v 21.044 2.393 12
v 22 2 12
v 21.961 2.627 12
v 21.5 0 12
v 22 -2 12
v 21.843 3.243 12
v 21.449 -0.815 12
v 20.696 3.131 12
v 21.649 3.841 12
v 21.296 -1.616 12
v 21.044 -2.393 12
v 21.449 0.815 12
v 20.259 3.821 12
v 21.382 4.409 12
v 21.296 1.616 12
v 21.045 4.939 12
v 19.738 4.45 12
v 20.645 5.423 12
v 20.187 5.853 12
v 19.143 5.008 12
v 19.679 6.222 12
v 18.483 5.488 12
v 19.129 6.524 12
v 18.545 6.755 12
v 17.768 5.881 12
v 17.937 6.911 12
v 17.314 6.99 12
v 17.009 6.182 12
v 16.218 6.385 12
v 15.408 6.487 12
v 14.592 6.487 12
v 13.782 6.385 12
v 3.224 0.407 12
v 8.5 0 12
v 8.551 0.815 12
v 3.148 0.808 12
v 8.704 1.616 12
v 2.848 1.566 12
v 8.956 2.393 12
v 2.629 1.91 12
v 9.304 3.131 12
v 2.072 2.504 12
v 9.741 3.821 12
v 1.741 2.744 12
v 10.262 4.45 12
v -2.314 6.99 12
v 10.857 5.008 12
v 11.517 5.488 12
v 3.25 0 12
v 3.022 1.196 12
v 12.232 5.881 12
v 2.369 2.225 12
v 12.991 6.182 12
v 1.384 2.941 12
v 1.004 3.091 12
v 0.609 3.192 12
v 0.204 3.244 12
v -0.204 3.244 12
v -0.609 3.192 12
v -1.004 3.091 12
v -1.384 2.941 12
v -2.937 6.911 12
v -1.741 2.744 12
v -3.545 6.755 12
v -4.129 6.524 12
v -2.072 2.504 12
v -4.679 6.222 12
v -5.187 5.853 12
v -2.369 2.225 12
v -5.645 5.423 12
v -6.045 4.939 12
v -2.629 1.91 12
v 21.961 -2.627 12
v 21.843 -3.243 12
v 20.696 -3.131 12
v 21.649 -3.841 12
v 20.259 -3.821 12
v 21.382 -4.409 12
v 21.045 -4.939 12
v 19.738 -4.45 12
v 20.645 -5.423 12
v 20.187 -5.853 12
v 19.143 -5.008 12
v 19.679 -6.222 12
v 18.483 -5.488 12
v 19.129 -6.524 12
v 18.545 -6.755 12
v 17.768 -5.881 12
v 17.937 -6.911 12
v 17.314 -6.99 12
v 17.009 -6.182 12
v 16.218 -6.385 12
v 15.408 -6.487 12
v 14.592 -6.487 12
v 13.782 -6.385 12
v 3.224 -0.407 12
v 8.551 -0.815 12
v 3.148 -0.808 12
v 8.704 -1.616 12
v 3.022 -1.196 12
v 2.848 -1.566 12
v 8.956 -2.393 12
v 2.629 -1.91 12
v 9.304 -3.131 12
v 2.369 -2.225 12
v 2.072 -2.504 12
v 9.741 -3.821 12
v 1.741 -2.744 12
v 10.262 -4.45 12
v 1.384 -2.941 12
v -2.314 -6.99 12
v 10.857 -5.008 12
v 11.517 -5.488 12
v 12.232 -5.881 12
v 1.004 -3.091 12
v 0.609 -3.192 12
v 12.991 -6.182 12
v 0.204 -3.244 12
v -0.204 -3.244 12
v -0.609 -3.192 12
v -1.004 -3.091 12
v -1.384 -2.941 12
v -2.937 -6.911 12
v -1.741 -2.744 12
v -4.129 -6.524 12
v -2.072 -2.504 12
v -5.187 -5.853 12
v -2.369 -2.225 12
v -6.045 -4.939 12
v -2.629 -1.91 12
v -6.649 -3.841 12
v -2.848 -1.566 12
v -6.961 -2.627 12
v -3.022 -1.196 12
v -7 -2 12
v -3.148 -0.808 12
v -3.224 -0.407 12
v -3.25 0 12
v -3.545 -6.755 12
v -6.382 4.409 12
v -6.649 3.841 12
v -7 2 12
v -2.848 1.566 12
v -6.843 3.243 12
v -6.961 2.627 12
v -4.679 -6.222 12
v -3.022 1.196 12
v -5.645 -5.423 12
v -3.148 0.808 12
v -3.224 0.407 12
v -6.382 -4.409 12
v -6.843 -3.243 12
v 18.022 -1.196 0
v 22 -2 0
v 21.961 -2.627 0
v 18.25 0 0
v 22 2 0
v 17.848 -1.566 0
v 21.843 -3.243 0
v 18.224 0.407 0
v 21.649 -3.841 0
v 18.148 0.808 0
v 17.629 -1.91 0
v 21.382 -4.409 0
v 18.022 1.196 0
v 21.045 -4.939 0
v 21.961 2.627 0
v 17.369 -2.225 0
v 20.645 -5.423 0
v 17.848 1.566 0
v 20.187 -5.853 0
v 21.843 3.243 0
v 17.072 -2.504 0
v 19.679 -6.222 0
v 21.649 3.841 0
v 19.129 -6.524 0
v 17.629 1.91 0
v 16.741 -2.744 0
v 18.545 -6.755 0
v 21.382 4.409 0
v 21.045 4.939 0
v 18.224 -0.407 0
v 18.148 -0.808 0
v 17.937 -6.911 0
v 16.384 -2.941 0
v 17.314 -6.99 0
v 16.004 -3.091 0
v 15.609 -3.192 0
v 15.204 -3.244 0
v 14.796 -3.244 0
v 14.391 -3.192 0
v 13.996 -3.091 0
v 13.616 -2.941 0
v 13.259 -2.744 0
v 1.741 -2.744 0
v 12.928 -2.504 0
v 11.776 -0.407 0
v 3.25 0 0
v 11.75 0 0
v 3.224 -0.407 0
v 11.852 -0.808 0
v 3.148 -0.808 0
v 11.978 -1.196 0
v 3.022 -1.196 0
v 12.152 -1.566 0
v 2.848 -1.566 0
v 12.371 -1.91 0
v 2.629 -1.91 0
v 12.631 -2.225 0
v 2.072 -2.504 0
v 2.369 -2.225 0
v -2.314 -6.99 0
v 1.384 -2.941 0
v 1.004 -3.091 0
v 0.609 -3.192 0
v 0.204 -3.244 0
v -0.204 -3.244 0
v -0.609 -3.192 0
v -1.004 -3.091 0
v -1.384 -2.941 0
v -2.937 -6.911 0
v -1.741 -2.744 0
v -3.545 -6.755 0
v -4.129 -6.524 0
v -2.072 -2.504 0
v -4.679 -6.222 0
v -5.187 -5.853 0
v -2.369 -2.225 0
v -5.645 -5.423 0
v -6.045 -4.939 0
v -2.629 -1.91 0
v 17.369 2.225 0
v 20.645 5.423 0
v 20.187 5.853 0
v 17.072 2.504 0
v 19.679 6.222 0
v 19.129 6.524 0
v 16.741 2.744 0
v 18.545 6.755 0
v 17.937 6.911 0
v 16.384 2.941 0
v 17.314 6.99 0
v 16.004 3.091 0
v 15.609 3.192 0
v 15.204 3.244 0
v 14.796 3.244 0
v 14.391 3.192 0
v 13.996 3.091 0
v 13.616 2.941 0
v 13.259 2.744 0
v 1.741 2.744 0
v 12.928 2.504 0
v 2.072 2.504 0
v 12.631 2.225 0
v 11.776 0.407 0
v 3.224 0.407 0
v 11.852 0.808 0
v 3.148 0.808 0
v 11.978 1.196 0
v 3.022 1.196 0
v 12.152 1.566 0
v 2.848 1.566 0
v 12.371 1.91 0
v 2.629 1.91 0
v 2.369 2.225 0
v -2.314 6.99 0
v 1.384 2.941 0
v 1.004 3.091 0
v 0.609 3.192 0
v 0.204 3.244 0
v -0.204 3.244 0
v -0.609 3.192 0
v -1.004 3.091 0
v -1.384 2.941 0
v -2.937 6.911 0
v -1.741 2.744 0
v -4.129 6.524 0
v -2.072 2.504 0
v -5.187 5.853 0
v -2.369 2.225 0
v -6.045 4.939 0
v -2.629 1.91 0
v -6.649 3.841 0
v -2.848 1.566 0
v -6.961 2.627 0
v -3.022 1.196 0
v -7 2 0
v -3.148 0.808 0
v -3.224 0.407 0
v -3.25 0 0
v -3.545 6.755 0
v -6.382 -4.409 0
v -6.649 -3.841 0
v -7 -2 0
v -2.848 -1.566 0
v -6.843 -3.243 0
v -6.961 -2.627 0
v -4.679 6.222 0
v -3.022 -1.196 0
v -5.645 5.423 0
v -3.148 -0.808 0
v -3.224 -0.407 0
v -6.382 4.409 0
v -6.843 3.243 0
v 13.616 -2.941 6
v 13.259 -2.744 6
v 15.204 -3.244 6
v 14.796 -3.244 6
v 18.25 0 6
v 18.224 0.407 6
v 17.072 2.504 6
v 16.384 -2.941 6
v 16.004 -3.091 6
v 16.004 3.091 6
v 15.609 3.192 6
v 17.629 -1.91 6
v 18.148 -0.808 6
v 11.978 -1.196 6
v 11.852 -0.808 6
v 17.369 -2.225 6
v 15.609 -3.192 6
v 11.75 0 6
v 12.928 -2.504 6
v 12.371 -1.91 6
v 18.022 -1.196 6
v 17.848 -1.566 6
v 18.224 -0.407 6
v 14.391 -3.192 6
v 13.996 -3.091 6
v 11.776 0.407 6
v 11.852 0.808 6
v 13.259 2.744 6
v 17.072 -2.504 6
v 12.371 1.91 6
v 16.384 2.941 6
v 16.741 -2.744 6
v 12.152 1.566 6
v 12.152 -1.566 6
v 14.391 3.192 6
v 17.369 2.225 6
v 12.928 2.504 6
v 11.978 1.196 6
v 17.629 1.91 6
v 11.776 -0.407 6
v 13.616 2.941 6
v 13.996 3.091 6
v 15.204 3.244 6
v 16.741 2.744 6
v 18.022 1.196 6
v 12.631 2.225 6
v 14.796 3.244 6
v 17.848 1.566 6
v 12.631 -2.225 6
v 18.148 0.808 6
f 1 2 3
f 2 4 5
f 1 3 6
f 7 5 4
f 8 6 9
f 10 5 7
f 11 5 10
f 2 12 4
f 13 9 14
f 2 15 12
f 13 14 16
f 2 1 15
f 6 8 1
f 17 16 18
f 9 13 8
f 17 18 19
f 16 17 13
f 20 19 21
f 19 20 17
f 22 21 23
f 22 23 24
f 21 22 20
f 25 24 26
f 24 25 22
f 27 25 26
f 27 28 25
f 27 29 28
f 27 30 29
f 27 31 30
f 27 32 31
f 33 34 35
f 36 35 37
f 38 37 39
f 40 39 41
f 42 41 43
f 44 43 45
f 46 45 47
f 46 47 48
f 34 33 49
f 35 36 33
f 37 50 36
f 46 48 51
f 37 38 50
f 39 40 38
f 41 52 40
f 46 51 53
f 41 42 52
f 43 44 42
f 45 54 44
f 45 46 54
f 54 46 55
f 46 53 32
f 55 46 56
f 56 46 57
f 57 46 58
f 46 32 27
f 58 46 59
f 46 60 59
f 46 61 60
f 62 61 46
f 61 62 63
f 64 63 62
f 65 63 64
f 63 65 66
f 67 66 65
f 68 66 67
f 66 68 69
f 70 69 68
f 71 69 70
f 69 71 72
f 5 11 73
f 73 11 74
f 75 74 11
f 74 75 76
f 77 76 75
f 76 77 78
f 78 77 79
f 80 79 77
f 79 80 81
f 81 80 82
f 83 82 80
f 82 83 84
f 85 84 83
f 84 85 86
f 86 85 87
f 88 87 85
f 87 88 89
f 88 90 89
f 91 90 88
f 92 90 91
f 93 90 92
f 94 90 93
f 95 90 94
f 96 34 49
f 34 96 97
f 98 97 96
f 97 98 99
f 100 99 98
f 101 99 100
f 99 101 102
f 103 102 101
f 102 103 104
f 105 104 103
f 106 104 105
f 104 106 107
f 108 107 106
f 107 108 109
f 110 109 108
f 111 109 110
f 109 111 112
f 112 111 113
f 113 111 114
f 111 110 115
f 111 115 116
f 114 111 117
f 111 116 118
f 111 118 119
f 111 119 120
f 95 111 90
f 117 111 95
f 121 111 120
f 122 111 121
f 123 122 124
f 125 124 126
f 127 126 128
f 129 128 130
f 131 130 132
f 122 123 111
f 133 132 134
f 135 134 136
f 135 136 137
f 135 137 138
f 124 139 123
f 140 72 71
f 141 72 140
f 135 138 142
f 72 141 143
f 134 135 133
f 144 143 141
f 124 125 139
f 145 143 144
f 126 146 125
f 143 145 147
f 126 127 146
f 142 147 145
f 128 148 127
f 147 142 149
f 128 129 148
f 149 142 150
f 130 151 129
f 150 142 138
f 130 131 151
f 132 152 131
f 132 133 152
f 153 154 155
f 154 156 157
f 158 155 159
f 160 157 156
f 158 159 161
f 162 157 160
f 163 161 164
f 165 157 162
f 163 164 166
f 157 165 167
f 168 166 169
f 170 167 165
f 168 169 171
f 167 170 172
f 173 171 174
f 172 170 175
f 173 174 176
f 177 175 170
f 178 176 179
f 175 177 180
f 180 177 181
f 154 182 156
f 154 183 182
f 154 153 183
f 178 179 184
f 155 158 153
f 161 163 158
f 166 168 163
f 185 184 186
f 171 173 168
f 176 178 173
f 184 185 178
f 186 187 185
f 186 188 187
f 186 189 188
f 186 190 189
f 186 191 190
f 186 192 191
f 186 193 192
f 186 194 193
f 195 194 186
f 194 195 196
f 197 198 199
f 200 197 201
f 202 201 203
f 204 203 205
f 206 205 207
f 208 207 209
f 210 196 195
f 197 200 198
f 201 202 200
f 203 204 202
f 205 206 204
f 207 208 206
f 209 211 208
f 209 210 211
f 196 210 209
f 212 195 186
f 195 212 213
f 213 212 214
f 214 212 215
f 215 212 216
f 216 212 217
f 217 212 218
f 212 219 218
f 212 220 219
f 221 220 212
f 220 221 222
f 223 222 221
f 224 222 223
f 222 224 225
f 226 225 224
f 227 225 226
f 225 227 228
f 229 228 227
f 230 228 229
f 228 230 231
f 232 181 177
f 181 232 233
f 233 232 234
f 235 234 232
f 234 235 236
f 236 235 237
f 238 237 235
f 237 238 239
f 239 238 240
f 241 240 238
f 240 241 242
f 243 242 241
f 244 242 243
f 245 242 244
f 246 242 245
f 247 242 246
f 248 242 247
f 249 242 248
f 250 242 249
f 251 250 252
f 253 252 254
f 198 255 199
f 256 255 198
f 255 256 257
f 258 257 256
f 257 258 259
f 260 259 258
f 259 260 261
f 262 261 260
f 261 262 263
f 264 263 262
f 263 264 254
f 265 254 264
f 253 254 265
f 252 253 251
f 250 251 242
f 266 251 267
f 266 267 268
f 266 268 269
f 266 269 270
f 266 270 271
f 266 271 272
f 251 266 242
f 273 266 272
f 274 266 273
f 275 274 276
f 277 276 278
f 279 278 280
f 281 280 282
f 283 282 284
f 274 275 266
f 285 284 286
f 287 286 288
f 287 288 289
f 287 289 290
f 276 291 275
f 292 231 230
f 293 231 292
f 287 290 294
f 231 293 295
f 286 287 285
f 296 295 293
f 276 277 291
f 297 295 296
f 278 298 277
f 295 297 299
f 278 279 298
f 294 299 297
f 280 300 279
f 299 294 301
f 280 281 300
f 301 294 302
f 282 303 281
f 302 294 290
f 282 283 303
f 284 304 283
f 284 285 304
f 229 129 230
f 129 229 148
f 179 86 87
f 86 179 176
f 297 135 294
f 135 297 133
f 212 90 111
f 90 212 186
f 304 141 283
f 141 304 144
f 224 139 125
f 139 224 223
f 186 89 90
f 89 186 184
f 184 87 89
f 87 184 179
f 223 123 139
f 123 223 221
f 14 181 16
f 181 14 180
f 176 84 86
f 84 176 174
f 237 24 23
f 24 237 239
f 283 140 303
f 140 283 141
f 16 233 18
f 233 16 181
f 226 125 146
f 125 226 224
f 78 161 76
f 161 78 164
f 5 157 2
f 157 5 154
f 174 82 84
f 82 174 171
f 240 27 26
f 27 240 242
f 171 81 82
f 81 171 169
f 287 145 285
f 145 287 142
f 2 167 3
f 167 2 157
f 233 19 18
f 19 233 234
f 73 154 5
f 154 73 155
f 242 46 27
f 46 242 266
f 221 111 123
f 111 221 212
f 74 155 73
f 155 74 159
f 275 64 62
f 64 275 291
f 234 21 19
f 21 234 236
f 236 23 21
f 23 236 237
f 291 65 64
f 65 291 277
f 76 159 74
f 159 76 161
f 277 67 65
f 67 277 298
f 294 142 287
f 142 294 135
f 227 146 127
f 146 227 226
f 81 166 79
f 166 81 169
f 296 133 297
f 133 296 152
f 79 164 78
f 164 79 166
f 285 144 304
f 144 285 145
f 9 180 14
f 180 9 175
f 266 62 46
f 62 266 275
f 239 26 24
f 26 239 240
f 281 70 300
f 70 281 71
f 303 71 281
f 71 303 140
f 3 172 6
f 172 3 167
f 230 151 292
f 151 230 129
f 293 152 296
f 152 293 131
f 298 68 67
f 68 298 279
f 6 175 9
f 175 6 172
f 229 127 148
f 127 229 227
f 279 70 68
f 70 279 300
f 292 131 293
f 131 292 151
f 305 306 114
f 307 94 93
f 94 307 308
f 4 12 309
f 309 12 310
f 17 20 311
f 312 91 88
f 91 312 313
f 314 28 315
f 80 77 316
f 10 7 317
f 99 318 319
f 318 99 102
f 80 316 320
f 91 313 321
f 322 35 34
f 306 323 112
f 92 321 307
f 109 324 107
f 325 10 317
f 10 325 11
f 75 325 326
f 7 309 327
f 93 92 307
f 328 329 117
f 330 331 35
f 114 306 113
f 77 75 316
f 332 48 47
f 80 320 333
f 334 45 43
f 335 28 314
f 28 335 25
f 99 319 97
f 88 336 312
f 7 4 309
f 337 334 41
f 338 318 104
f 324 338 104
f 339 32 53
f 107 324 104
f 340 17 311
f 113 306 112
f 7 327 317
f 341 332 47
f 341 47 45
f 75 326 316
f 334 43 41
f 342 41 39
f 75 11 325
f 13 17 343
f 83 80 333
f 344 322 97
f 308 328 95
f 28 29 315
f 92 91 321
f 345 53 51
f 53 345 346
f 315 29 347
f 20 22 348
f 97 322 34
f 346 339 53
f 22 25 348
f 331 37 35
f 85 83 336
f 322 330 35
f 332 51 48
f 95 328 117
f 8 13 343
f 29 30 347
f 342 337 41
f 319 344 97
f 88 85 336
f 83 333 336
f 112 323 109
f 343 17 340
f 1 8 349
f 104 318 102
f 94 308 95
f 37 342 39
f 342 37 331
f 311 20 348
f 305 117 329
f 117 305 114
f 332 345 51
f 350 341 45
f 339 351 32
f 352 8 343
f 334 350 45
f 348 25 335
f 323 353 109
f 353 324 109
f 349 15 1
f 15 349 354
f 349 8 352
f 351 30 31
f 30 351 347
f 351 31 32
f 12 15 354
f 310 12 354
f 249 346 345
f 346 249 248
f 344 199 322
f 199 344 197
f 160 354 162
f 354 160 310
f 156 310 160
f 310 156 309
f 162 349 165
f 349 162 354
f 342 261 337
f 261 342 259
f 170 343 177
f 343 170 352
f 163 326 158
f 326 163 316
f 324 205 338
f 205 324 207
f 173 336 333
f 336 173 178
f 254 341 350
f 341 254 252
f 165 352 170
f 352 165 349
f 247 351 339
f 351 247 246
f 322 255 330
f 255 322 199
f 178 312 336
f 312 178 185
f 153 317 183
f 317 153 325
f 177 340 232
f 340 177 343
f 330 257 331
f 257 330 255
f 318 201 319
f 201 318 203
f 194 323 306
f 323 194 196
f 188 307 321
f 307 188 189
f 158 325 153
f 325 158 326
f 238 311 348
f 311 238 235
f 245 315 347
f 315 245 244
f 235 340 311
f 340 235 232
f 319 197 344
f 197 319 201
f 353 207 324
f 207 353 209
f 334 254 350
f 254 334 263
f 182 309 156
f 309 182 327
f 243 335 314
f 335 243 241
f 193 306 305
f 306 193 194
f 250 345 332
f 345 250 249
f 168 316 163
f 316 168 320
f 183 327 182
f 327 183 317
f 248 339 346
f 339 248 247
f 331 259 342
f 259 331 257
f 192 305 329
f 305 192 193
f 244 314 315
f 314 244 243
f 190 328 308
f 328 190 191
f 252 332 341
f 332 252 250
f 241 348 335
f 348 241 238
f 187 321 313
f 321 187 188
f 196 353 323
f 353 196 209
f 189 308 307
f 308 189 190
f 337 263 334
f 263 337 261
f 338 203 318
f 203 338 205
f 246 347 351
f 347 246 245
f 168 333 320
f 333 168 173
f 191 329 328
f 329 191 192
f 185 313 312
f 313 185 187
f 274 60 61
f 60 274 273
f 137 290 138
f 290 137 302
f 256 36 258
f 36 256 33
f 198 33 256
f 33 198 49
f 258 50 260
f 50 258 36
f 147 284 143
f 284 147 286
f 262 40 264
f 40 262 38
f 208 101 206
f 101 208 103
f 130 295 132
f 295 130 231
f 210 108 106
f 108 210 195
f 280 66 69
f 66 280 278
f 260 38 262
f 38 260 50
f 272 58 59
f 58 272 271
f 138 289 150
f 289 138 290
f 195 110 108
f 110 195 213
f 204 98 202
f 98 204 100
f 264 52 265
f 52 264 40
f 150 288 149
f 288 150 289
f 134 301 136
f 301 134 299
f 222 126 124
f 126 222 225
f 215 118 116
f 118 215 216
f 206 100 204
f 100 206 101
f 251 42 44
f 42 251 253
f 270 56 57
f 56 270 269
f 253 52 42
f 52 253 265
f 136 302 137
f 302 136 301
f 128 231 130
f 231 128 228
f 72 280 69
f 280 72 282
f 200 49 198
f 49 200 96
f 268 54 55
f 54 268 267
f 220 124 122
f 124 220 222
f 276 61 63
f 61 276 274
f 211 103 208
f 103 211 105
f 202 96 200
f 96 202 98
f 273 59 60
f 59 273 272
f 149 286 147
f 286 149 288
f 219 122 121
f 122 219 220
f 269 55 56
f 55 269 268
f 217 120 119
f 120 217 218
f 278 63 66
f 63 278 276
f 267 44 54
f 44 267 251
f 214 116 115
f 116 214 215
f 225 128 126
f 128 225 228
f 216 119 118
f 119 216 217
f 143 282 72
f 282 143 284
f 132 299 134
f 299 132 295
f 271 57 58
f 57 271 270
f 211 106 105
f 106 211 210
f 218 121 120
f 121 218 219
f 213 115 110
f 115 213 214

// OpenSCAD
$fn = 50;


difference() {
	union() {
		cylinder(h = 12, r = 7.0000000000);
		translate(v = [7.5000000000, 0.0000000000, 0]) {
			hull() {
				translate(v = [-9.5000000000, 2.0000000000, 0]) {
					cylinder(h = 12, r = 5);
				}
				translate(v = [9.5000000000, 2.0000000000, 0]) {
					cylinder(h = 12, r = 5);
				}
				translate(v = [-9.5000000000, -2.0000000000, 0]) {
					cylinder(h = 12, r = 5);
				}
				translate(v = [9.5000000000, -2.0000000000, 0]) {
					cylinder(h = 12, r = 5);
				}
			}
		}
		translate(v = [7.5000000000, 0.0000000000, 0]) {
			hull() {
				translate(v = [-9.5000000000, 2.0000000000, 0]) {
					cylinder(h = 12, r = 5);
				}
				translate(v = [9.5000000000, 2.0000000000, 0]) {
					cylinder(h = 12, r = 5);
				}
				translate(v = [-9.5000000000, -2.0000000000, 0]) {
					cylinder(h = 12, r = 5);
				}
				translate(v = [9.5000000000, -2.0000000000, 0]) {
					cylinder(h = 12, r = 5);
				}
			}
		}
	}
	union() {
		translate(v = [15.0000000000, 0.0000000000, 12]) {
			rotate(a = [0, 0, 0]) {
				difference() {
					union() {
						#translate(v = [0, 0, -12.0000000000]) {
							cylinder(h = 12, r = 2.2500000000);
						}
						#translate(v = [0, 0, -6]) {
							cylinder(h = 6, r1 = 3.2500000000, r2 = 6.5000000000);
						}
						#translate(v = [0, 0, -12.0000000000]) {
							cylinder(h = 12, r = 3.2500000000);
						}
						#translate(v = [0, 0, -12.0000000000]) {
							cylinder(h = 12, r = 2.2500000000);
						}
					}
					union();
				}
			}
		}
		translate(v = [15.0000000000, 0.0000000000, 12]) {
			rotate(a = [0, 0, 0]) {
				difference() {
					union() {
						#translate(v = [0, 0, -12.0000000000]) {
							cylinder(h = 12, r = 2.2500000000);
						}
						#translate(v = [0, 0, -6]) {
							cylinder(h = 6, r1 = 3.2500000000, r2 = 6.5000000000);
						}
						#translate(v = [0, 0, -12.0000000000]) {
							cylinder(h = 12, r = 3.2500000000);
						}
						#translate(v = [0, 0, -12.0000000000]) {
							cylinder(h = 12, r = 2.2500000000);
						}
					}
					union();
				}
			}
		}
		translate(v = [0, 0, -100]) {
			cylinder(h = 200, r = 3.2500000000);
		}
		translate(v = [0, 0, -100]) {
			cylinder(h = 200, r = 1.8000000000);
		}
	}
}
